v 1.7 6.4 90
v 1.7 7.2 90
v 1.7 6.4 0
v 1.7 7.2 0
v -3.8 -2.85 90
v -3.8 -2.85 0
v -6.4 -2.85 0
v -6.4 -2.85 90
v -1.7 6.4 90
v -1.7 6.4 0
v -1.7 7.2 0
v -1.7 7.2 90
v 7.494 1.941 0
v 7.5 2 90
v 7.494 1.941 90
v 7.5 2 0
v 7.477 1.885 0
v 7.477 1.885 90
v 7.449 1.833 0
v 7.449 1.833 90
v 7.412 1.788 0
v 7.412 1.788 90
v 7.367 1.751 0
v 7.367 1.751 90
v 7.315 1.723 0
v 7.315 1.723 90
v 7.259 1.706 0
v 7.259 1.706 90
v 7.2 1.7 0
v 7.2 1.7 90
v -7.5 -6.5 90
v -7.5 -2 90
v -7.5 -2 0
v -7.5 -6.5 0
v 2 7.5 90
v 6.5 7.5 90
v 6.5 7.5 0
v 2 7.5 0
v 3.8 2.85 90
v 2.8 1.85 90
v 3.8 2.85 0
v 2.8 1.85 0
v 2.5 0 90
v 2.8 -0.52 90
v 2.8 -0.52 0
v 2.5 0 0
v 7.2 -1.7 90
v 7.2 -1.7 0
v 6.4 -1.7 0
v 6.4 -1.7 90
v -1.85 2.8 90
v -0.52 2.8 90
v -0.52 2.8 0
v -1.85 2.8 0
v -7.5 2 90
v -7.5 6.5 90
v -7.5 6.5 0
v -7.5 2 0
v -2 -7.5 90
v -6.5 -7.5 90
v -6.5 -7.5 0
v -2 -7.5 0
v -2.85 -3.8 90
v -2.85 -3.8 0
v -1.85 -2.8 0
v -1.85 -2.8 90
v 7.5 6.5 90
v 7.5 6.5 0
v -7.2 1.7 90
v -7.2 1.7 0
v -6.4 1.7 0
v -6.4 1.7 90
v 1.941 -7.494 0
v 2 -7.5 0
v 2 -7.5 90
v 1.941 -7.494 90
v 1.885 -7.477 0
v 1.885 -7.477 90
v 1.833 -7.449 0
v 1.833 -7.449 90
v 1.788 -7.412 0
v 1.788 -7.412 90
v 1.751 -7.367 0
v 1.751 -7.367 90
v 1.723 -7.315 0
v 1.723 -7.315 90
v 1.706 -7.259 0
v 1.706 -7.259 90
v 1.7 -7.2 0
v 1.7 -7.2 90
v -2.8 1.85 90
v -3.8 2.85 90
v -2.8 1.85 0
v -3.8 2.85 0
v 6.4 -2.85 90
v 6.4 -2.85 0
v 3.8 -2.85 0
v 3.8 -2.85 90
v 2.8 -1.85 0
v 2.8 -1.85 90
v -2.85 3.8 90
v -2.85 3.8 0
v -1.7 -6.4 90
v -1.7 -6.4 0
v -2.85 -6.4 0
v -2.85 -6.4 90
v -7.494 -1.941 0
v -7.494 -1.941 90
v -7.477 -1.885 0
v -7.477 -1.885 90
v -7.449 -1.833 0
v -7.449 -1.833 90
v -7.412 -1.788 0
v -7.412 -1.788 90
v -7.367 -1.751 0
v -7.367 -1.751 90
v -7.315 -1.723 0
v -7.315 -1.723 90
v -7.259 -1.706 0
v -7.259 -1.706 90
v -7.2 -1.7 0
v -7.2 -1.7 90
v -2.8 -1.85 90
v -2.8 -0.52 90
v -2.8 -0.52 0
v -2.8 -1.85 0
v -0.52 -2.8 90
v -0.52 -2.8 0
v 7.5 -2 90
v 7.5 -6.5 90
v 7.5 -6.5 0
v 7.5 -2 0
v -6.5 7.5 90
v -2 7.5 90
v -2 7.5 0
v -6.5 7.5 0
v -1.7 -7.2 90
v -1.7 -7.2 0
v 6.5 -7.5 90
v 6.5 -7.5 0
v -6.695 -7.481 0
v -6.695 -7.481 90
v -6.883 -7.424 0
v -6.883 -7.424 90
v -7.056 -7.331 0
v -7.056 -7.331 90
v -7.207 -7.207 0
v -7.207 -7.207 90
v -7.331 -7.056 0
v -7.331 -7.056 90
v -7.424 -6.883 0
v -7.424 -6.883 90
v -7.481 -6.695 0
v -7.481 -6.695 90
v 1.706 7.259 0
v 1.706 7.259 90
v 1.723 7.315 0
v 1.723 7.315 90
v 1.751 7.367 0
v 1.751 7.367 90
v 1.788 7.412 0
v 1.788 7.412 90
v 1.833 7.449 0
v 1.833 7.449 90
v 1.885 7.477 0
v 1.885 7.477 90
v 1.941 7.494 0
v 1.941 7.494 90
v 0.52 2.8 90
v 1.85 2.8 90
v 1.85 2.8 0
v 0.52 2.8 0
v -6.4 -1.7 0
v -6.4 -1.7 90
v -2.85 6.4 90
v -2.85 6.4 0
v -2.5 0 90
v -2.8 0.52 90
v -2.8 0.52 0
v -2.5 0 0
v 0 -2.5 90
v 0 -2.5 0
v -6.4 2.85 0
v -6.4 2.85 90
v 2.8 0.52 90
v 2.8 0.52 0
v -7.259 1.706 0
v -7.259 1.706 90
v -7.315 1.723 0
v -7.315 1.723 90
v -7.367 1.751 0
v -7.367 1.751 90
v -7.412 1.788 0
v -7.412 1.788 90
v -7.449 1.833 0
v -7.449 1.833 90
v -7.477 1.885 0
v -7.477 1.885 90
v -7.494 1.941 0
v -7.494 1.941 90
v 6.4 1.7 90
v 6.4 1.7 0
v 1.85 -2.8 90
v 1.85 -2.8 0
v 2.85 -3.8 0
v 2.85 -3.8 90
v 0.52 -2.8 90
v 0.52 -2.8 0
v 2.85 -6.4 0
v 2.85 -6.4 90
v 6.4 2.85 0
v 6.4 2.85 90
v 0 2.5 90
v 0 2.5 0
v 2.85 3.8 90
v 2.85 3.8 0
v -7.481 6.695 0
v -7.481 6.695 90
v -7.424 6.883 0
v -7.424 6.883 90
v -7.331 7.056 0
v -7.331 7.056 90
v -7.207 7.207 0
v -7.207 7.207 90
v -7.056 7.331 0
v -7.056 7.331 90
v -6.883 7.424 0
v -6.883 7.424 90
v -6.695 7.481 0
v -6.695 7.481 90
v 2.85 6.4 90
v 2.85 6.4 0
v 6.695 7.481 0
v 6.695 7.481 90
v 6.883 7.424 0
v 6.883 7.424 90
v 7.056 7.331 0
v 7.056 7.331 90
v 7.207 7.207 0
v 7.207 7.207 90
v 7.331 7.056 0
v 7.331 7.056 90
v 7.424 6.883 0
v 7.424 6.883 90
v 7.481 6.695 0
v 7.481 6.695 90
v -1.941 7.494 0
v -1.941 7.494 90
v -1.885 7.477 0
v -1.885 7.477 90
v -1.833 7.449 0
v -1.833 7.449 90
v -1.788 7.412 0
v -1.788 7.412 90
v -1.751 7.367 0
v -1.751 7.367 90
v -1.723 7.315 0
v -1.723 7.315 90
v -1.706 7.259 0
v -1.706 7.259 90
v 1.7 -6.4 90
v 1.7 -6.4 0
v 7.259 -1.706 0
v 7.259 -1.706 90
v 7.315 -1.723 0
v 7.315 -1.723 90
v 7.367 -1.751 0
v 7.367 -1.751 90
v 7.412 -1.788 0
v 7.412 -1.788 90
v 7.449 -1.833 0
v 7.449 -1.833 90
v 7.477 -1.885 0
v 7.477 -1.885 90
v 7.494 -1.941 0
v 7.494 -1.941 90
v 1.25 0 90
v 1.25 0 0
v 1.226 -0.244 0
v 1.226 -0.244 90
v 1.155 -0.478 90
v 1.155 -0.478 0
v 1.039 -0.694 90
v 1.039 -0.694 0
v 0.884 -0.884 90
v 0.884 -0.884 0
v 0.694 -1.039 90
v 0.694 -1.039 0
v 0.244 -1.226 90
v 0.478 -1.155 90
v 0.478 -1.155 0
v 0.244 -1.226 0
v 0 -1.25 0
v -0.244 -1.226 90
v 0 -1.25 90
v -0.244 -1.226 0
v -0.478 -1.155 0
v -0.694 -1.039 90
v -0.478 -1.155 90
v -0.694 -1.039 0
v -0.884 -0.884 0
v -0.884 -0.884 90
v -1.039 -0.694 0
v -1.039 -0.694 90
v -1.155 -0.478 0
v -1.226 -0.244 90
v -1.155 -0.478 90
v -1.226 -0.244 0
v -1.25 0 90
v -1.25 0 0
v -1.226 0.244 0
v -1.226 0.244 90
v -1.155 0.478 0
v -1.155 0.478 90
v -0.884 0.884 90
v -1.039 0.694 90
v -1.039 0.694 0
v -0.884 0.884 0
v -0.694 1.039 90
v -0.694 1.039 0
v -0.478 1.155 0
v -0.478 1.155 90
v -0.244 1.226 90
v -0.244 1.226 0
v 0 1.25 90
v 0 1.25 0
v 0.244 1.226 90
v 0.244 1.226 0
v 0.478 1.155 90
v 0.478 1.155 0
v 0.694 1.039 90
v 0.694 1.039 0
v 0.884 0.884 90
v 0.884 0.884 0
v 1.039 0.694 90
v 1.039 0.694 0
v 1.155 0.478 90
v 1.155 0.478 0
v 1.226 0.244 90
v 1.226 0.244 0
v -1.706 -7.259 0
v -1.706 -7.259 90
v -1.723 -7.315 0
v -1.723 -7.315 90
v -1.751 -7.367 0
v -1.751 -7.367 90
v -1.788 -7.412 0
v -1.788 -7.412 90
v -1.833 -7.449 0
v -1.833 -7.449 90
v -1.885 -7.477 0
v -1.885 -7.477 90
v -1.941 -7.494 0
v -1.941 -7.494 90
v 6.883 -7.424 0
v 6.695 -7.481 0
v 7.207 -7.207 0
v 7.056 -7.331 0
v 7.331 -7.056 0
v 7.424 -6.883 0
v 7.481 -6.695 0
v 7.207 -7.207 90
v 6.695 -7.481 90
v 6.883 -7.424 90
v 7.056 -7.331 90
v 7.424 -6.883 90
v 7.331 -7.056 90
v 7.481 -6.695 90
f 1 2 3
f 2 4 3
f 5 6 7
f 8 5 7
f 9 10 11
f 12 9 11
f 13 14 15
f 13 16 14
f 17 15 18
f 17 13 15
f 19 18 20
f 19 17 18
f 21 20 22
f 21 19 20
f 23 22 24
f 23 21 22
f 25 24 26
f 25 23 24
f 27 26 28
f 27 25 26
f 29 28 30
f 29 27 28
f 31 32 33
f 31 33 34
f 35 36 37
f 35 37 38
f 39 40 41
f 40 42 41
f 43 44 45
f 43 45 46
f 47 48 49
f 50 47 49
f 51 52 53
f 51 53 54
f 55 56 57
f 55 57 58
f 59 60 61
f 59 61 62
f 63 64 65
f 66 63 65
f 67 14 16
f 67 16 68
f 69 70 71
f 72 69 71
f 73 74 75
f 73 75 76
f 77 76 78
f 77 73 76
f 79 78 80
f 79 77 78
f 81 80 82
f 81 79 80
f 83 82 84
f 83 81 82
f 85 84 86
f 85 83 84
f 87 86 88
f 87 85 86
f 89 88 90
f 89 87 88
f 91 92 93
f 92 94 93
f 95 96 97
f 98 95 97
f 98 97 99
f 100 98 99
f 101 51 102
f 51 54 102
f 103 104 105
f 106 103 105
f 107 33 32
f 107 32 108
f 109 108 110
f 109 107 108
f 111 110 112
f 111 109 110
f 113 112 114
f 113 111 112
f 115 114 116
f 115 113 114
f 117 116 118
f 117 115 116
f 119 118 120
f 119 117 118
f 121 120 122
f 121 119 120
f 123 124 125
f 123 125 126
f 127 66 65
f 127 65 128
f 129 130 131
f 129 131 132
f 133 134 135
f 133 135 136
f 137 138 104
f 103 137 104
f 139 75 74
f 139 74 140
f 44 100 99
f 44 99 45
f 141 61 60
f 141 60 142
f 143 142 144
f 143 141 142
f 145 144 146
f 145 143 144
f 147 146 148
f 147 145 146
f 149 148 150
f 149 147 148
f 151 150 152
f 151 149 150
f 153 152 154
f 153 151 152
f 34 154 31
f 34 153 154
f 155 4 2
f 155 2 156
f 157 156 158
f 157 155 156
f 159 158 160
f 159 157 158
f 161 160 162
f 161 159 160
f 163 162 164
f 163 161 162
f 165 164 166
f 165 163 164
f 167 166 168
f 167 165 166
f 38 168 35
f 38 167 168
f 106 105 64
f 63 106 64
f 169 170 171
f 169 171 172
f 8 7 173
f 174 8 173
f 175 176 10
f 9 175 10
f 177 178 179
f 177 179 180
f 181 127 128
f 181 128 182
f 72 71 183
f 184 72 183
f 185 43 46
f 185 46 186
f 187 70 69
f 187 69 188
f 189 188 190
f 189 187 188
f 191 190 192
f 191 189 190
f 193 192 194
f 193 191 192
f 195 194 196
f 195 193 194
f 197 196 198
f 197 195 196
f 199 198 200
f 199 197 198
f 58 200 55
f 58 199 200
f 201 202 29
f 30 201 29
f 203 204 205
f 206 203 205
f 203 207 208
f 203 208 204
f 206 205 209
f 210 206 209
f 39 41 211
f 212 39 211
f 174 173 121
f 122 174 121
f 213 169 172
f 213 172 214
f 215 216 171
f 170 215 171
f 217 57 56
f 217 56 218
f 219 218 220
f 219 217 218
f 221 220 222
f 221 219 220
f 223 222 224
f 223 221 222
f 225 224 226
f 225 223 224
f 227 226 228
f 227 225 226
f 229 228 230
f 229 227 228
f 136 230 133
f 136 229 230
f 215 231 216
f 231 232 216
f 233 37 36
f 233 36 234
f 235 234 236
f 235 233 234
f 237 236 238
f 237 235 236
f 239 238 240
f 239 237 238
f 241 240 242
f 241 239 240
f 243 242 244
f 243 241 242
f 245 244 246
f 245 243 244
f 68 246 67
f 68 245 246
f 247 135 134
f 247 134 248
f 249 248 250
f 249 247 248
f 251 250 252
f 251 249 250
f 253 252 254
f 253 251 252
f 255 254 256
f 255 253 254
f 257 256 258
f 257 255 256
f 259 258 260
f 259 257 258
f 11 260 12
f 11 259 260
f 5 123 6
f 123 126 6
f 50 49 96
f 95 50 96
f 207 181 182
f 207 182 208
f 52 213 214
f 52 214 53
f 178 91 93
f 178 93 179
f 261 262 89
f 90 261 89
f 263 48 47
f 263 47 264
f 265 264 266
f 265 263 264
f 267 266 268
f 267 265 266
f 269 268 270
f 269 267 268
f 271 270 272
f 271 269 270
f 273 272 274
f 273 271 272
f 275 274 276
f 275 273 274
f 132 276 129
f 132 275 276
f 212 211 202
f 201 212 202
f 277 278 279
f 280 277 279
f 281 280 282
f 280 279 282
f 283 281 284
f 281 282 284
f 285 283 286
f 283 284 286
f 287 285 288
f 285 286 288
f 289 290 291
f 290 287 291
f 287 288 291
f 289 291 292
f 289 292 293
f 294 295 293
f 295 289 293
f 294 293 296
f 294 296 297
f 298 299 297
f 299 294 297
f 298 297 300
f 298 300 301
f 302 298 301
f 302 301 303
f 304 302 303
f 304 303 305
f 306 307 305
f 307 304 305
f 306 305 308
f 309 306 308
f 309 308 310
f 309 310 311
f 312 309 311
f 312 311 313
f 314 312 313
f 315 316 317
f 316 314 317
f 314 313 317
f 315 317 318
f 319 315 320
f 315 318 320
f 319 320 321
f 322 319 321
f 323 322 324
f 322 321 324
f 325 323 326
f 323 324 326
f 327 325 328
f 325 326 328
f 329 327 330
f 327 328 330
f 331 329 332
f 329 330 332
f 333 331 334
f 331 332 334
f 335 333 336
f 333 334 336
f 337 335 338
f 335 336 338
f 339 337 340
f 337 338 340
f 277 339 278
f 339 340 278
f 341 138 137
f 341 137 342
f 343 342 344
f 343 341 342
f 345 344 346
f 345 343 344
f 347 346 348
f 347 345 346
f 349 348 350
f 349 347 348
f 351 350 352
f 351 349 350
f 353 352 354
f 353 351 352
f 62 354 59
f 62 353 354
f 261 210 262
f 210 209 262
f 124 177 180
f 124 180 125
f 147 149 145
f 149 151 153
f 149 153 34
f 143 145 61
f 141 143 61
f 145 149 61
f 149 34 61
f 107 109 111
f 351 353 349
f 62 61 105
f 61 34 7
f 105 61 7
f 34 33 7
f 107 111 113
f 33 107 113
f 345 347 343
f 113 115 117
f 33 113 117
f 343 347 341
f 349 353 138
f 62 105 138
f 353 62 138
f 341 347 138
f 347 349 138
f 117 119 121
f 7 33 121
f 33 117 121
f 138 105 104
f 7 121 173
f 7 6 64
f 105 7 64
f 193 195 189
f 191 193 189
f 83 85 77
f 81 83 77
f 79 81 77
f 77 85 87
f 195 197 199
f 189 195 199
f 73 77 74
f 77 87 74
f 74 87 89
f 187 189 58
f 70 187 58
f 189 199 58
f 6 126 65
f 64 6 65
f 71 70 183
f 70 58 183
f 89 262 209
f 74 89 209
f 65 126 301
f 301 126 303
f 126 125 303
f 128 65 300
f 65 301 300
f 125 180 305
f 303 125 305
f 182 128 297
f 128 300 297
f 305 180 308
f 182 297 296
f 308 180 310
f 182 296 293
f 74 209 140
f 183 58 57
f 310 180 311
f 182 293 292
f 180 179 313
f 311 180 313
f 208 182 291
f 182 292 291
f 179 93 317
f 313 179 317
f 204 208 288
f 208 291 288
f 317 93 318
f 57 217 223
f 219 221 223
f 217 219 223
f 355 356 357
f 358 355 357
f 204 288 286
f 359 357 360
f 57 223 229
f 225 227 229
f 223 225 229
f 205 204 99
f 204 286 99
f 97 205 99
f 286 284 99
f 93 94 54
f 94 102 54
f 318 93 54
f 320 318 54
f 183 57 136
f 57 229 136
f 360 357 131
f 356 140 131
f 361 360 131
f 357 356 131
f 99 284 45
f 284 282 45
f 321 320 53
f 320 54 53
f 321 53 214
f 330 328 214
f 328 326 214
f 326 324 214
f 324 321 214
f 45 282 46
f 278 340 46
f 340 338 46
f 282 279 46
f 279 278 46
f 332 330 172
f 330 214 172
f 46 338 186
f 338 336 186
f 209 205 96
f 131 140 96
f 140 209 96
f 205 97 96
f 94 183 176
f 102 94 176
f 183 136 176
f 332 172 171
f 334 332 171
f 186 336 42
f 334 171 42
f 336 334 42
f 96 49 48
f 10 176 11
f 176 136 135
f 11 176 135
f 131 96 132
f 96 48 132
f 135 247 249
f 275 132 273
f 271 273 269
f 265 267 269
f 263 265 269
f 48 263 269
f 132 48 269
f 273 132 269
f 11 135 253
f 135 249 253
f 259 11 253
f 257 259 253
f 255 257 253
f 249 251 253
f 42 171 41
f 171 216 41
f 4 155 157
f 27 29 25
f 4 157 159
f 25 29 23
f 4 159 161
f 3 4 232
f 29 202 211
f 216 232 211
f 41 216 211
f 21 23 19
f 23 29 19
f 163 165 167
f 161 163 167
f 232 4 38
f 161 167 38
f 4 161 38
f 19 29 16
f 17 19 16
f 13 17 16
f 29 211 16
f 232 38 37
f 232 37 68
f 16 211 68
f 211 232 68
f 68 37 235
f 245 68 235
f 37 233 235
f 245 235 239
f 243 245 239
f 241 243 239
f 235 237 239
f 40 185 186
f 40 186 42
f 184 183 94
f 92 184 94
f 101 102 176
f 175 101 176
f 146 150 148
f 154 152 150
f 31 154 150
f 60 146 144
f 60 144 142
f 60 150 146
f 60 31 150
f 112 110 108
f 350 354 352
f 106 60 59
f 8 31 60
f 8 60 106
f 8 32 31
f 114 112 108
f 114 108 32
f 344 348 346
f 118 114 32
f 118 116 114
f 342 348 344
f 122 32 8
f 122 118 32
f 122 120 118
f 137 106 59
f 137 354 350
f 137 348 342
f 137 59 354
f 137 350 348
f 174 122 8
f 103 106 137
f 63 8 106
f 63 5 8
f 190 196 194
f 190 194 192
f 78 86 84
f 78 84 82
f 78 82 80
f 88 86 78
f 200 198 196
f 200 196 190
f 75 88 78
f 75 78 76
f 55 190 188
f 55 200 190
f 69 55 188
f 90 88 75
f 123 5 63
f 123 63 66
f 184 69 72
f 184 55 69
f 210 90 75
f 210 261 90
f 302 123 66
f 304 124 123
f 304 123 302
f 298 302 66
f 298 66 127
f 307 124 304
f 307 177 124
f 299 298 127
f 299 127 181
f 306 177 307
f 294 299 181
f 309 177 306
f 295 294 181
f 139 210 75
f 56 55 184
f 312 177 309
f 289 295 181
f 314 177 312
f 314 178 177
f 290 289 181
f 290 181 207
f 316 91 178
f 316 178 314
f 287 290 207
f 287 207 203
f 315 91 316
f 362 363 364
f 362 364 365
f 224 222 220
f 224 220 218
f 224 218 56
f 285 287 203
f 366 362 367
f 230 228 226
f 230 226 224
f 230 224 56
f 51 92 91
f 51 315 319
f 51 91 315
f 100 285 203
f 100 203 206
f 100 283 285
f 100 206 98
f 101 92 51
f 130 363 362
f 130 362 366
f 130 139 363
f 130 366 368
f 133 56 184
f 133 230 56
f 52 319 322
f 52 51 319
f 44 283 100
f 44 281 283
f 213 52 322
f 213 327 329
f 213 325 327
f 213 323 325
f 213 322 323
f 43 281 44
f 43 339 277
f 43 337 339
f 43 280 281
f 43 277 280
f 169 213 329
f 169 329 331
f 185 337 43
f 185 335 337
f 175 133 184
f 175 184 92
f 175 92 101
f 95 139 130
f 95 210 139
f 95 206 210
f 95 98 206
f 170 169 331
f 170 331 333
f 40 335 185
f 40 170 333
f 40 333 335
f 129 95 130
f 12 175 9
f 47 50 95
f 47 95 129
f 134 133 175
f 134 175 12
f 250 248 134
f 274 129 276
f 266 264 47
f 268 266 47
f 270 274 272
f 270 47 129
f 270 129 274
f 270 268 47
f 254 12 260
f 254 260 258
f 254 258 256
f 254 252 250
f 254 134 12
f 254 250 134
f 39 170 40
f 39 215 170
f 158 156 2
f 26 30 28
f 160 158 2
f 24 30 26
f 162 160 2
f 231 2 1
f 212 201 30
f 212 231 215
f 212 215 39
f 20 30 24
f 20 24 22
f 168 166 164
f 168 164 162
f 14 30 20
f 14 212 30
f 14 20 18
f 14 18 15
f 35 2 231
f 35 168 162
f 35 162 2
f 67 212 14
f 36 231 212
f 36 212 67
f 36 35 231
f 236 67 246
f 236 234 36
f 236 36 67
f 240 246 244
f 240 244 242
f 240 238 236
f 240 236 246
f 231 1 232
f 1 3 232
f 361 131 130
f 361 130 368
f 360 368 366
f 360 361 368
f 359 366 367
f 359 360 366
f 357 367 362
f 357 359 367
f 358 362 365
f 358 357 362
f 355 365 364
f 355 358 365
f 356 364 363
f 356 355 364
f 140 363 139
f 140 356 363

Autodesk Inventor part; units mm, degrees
ref_plane "YZ Plane" through (0, 0, 0) normal (1, 0, 0) x (0, 1, 0)
ref_plane "XZ Plane" through (0, 0, 0) normal (0, 1, 0) x (-1, 0, 0)
ref_plane "XY Plane" through (0, 0, 0) normal (0, 0, 1) x (1, 0, 0)
sketch "Sketch_1" plane through (0, 0, 0) normal (0, 0, 1) x (1, 0, 0)
  line L0 (-7.5, 6.5) -> (-7.5, 2)
  arc A0 (-7.5, 2) -> (-7.2, 1.7) centre (-7.2, 2) ccw
  line L1 (-7.2, 1.7) -> (-6.4, 1.7)
  line L2 (-6.4, 1.7) -> (-6.4, 2.85)
  line L3 (-6.4, 2.85) -> (-3.8, 2.85)
  line L4 (-3.8, 2.85) -> (-2.8, 1.85)
  line L5 (-2.8, 1.85) -> (-2.8, 0.5196)
  line L6 (-2.8, 0.5196) -> (-2.5, 0)
  line L7 (-2.5, 0) -> (-2.8, -0.5196)
  line L8 (-2.8, -0.5196) -> (-2.8, -1.85)
  line L9 (-2.8, -1.85) -> (-3.8, -2.85)
  line L10 (-3.8, -2.85) -> (-6.4, -2.85)
  line L11 (-6.4, -2.85) -> (-6.4, -1.7)
  line L12 (-6.4, -1.7) -> (-7.2, -1.7)
  arc A1 (-7.2, -1.7) -> (-7.5, -2) centre (-7.2, -2) ccw
  line L13 (-7.5, -2) -> (-7.5, -6.5)
  arc A2 (-7.5, -6.5) -> (-6.5, -7.5) centre (-6.5, -6.5) ccw
  line L14 (-6.5, -7.5) -> (-2, -7.5)
  arc A3 (-2, -7.5) -> (-1.7, -7.2) centre (-2, -7.2) ccw
  line L15 (-1.7, -7.2) -> (-1.7, -6.4)
  line L16 (-1.7, -6.4) -> (-2.85, -6.4)
  line L17 (-2.85, -6.4) -> (-2.85, -3.8)
  line L18 (-2.85, -3.8) -> (-1.85, -2.8)
  line L19 (-1.85, -2.8) -> (-0.5196, -2.8)
  line L20 (-0.5196, -2.8) -> (0, -2.5)
  line L21 (0, -2.5) -> (0.5196, -2.8)
  line L22 (0.5196, -2.8) -> (1.85, -2.8)
  line L23 (1.85, -2.8) -> (2.85, -3.8)
  line L24 (2.85, -3.8) -> (2.85, -6.4)
  line L25 (2.85, -6.4) -> (1.7, -6.4)
  line L26 (1.7, -6.4) -> (1.7, -7.2)
  arc A4 (1.7, -7.2) -> (2, -7.5) centre (2, -7.2) ccw
  line L27 (2, -7.5) -> (6.5, -7.5)
  arc A5 (6.5, -7.5) -> (7.5, -6.5) centre (6.5, -6.5) ccw
  line L28 (7.5, -6.5) -> (7.5, -2)
  arc A6 (7.5, -2) -> (7.2, -1.7) centre (7.2, -2) ccw
  line L29 (7.2, -1.7) -> (6.4, -1.7)
  line L30 (6.4, -1.7) -> (6.4, -2.85)
  line L31 (6.4, -2.85) -> (3.8, -2.85)
  line L32 (3.8, -2.85) -> (2.8, -1.85)
  line L33 (2.8, -1.85) -> (2.8, -0.5196)
  line L34 (2.8, -0.5196) -> (2.5, 0)
  line L35 (2.5, 0) -> (2.8, 0.5196)
  line L36 (2.8, 0.5196) -> (2.8, 1.85)
  line L37 (2.8, 1.85) -> (3.8, 2.85)
  line L38 (3.8, 2.85) -> (6.4, 2.85)
  line L39 (6.4, 2.85) -> (6.4, 1.7)
  line L40 (6.4, 1.7) -> (7.2, 1.7)
  arc A7 (7.2, 1.7) -> (7.5, 2) centre (7.2, 2) ccw
  line L41 (7.5, 2) -> (7.5, 6.5)
  arc A8 (7.5, 6.5) -> (6.5, 7.5) centre (6.5, 6.5) ccw
  line L42 (6.5, 7.5) -> (2, 7.5)
  arc A9 (2, 7.5) -> (1.7, 7.2) centre (2, 7.2) ccw
  line L43 (1.7, 7.2) -> (1.7, 6.4)
  line L44 (1.7, 6.4) -> (2.85, 6.4)
  line L45 (2.85, 6.4) -> (2.85, 3.8)
  line L46 (2.85, 3.8) -> (1.85, 2.8)
  line L47 (1.85, 2.8) -> (0.5196, 2.8)
  line L48 (0.5196, 2.8) -> (0, 2.5)
  line L49 (0, 2.5) -> (-0.5196, 2.8)
  line L50 (-0.5196, 2.8) -> (-1.85, 2.8)
  line L51 (-1.85, 2.8) -> (-2.85, 3.8)
  line L52 (-2.85, 3.8) -> (-2.85, 6.4)
  line L53 (-2.85, 6.4) -> (-1.7, 6.4)
  line L54 (-1.7, 6.4) -> (-1.7, 7.2)
  arc A10 (-1.7, 7.2) -> (-2, 7.5) centre (-2, 7.2) ccw
  line L55 (-2, 7.5) -> (-6.5, 7.5)
  arc A11 (-6.5, 7.5) -> (-7.5, 6.5) centre (-6.5, 6.5) ccw
  circle A12 centre (0, 0) radius 1.25
extrude "Extrusion1" add sketch "Sketch_1" along normal blind 90
properties part number "HFS3-1515-90"
